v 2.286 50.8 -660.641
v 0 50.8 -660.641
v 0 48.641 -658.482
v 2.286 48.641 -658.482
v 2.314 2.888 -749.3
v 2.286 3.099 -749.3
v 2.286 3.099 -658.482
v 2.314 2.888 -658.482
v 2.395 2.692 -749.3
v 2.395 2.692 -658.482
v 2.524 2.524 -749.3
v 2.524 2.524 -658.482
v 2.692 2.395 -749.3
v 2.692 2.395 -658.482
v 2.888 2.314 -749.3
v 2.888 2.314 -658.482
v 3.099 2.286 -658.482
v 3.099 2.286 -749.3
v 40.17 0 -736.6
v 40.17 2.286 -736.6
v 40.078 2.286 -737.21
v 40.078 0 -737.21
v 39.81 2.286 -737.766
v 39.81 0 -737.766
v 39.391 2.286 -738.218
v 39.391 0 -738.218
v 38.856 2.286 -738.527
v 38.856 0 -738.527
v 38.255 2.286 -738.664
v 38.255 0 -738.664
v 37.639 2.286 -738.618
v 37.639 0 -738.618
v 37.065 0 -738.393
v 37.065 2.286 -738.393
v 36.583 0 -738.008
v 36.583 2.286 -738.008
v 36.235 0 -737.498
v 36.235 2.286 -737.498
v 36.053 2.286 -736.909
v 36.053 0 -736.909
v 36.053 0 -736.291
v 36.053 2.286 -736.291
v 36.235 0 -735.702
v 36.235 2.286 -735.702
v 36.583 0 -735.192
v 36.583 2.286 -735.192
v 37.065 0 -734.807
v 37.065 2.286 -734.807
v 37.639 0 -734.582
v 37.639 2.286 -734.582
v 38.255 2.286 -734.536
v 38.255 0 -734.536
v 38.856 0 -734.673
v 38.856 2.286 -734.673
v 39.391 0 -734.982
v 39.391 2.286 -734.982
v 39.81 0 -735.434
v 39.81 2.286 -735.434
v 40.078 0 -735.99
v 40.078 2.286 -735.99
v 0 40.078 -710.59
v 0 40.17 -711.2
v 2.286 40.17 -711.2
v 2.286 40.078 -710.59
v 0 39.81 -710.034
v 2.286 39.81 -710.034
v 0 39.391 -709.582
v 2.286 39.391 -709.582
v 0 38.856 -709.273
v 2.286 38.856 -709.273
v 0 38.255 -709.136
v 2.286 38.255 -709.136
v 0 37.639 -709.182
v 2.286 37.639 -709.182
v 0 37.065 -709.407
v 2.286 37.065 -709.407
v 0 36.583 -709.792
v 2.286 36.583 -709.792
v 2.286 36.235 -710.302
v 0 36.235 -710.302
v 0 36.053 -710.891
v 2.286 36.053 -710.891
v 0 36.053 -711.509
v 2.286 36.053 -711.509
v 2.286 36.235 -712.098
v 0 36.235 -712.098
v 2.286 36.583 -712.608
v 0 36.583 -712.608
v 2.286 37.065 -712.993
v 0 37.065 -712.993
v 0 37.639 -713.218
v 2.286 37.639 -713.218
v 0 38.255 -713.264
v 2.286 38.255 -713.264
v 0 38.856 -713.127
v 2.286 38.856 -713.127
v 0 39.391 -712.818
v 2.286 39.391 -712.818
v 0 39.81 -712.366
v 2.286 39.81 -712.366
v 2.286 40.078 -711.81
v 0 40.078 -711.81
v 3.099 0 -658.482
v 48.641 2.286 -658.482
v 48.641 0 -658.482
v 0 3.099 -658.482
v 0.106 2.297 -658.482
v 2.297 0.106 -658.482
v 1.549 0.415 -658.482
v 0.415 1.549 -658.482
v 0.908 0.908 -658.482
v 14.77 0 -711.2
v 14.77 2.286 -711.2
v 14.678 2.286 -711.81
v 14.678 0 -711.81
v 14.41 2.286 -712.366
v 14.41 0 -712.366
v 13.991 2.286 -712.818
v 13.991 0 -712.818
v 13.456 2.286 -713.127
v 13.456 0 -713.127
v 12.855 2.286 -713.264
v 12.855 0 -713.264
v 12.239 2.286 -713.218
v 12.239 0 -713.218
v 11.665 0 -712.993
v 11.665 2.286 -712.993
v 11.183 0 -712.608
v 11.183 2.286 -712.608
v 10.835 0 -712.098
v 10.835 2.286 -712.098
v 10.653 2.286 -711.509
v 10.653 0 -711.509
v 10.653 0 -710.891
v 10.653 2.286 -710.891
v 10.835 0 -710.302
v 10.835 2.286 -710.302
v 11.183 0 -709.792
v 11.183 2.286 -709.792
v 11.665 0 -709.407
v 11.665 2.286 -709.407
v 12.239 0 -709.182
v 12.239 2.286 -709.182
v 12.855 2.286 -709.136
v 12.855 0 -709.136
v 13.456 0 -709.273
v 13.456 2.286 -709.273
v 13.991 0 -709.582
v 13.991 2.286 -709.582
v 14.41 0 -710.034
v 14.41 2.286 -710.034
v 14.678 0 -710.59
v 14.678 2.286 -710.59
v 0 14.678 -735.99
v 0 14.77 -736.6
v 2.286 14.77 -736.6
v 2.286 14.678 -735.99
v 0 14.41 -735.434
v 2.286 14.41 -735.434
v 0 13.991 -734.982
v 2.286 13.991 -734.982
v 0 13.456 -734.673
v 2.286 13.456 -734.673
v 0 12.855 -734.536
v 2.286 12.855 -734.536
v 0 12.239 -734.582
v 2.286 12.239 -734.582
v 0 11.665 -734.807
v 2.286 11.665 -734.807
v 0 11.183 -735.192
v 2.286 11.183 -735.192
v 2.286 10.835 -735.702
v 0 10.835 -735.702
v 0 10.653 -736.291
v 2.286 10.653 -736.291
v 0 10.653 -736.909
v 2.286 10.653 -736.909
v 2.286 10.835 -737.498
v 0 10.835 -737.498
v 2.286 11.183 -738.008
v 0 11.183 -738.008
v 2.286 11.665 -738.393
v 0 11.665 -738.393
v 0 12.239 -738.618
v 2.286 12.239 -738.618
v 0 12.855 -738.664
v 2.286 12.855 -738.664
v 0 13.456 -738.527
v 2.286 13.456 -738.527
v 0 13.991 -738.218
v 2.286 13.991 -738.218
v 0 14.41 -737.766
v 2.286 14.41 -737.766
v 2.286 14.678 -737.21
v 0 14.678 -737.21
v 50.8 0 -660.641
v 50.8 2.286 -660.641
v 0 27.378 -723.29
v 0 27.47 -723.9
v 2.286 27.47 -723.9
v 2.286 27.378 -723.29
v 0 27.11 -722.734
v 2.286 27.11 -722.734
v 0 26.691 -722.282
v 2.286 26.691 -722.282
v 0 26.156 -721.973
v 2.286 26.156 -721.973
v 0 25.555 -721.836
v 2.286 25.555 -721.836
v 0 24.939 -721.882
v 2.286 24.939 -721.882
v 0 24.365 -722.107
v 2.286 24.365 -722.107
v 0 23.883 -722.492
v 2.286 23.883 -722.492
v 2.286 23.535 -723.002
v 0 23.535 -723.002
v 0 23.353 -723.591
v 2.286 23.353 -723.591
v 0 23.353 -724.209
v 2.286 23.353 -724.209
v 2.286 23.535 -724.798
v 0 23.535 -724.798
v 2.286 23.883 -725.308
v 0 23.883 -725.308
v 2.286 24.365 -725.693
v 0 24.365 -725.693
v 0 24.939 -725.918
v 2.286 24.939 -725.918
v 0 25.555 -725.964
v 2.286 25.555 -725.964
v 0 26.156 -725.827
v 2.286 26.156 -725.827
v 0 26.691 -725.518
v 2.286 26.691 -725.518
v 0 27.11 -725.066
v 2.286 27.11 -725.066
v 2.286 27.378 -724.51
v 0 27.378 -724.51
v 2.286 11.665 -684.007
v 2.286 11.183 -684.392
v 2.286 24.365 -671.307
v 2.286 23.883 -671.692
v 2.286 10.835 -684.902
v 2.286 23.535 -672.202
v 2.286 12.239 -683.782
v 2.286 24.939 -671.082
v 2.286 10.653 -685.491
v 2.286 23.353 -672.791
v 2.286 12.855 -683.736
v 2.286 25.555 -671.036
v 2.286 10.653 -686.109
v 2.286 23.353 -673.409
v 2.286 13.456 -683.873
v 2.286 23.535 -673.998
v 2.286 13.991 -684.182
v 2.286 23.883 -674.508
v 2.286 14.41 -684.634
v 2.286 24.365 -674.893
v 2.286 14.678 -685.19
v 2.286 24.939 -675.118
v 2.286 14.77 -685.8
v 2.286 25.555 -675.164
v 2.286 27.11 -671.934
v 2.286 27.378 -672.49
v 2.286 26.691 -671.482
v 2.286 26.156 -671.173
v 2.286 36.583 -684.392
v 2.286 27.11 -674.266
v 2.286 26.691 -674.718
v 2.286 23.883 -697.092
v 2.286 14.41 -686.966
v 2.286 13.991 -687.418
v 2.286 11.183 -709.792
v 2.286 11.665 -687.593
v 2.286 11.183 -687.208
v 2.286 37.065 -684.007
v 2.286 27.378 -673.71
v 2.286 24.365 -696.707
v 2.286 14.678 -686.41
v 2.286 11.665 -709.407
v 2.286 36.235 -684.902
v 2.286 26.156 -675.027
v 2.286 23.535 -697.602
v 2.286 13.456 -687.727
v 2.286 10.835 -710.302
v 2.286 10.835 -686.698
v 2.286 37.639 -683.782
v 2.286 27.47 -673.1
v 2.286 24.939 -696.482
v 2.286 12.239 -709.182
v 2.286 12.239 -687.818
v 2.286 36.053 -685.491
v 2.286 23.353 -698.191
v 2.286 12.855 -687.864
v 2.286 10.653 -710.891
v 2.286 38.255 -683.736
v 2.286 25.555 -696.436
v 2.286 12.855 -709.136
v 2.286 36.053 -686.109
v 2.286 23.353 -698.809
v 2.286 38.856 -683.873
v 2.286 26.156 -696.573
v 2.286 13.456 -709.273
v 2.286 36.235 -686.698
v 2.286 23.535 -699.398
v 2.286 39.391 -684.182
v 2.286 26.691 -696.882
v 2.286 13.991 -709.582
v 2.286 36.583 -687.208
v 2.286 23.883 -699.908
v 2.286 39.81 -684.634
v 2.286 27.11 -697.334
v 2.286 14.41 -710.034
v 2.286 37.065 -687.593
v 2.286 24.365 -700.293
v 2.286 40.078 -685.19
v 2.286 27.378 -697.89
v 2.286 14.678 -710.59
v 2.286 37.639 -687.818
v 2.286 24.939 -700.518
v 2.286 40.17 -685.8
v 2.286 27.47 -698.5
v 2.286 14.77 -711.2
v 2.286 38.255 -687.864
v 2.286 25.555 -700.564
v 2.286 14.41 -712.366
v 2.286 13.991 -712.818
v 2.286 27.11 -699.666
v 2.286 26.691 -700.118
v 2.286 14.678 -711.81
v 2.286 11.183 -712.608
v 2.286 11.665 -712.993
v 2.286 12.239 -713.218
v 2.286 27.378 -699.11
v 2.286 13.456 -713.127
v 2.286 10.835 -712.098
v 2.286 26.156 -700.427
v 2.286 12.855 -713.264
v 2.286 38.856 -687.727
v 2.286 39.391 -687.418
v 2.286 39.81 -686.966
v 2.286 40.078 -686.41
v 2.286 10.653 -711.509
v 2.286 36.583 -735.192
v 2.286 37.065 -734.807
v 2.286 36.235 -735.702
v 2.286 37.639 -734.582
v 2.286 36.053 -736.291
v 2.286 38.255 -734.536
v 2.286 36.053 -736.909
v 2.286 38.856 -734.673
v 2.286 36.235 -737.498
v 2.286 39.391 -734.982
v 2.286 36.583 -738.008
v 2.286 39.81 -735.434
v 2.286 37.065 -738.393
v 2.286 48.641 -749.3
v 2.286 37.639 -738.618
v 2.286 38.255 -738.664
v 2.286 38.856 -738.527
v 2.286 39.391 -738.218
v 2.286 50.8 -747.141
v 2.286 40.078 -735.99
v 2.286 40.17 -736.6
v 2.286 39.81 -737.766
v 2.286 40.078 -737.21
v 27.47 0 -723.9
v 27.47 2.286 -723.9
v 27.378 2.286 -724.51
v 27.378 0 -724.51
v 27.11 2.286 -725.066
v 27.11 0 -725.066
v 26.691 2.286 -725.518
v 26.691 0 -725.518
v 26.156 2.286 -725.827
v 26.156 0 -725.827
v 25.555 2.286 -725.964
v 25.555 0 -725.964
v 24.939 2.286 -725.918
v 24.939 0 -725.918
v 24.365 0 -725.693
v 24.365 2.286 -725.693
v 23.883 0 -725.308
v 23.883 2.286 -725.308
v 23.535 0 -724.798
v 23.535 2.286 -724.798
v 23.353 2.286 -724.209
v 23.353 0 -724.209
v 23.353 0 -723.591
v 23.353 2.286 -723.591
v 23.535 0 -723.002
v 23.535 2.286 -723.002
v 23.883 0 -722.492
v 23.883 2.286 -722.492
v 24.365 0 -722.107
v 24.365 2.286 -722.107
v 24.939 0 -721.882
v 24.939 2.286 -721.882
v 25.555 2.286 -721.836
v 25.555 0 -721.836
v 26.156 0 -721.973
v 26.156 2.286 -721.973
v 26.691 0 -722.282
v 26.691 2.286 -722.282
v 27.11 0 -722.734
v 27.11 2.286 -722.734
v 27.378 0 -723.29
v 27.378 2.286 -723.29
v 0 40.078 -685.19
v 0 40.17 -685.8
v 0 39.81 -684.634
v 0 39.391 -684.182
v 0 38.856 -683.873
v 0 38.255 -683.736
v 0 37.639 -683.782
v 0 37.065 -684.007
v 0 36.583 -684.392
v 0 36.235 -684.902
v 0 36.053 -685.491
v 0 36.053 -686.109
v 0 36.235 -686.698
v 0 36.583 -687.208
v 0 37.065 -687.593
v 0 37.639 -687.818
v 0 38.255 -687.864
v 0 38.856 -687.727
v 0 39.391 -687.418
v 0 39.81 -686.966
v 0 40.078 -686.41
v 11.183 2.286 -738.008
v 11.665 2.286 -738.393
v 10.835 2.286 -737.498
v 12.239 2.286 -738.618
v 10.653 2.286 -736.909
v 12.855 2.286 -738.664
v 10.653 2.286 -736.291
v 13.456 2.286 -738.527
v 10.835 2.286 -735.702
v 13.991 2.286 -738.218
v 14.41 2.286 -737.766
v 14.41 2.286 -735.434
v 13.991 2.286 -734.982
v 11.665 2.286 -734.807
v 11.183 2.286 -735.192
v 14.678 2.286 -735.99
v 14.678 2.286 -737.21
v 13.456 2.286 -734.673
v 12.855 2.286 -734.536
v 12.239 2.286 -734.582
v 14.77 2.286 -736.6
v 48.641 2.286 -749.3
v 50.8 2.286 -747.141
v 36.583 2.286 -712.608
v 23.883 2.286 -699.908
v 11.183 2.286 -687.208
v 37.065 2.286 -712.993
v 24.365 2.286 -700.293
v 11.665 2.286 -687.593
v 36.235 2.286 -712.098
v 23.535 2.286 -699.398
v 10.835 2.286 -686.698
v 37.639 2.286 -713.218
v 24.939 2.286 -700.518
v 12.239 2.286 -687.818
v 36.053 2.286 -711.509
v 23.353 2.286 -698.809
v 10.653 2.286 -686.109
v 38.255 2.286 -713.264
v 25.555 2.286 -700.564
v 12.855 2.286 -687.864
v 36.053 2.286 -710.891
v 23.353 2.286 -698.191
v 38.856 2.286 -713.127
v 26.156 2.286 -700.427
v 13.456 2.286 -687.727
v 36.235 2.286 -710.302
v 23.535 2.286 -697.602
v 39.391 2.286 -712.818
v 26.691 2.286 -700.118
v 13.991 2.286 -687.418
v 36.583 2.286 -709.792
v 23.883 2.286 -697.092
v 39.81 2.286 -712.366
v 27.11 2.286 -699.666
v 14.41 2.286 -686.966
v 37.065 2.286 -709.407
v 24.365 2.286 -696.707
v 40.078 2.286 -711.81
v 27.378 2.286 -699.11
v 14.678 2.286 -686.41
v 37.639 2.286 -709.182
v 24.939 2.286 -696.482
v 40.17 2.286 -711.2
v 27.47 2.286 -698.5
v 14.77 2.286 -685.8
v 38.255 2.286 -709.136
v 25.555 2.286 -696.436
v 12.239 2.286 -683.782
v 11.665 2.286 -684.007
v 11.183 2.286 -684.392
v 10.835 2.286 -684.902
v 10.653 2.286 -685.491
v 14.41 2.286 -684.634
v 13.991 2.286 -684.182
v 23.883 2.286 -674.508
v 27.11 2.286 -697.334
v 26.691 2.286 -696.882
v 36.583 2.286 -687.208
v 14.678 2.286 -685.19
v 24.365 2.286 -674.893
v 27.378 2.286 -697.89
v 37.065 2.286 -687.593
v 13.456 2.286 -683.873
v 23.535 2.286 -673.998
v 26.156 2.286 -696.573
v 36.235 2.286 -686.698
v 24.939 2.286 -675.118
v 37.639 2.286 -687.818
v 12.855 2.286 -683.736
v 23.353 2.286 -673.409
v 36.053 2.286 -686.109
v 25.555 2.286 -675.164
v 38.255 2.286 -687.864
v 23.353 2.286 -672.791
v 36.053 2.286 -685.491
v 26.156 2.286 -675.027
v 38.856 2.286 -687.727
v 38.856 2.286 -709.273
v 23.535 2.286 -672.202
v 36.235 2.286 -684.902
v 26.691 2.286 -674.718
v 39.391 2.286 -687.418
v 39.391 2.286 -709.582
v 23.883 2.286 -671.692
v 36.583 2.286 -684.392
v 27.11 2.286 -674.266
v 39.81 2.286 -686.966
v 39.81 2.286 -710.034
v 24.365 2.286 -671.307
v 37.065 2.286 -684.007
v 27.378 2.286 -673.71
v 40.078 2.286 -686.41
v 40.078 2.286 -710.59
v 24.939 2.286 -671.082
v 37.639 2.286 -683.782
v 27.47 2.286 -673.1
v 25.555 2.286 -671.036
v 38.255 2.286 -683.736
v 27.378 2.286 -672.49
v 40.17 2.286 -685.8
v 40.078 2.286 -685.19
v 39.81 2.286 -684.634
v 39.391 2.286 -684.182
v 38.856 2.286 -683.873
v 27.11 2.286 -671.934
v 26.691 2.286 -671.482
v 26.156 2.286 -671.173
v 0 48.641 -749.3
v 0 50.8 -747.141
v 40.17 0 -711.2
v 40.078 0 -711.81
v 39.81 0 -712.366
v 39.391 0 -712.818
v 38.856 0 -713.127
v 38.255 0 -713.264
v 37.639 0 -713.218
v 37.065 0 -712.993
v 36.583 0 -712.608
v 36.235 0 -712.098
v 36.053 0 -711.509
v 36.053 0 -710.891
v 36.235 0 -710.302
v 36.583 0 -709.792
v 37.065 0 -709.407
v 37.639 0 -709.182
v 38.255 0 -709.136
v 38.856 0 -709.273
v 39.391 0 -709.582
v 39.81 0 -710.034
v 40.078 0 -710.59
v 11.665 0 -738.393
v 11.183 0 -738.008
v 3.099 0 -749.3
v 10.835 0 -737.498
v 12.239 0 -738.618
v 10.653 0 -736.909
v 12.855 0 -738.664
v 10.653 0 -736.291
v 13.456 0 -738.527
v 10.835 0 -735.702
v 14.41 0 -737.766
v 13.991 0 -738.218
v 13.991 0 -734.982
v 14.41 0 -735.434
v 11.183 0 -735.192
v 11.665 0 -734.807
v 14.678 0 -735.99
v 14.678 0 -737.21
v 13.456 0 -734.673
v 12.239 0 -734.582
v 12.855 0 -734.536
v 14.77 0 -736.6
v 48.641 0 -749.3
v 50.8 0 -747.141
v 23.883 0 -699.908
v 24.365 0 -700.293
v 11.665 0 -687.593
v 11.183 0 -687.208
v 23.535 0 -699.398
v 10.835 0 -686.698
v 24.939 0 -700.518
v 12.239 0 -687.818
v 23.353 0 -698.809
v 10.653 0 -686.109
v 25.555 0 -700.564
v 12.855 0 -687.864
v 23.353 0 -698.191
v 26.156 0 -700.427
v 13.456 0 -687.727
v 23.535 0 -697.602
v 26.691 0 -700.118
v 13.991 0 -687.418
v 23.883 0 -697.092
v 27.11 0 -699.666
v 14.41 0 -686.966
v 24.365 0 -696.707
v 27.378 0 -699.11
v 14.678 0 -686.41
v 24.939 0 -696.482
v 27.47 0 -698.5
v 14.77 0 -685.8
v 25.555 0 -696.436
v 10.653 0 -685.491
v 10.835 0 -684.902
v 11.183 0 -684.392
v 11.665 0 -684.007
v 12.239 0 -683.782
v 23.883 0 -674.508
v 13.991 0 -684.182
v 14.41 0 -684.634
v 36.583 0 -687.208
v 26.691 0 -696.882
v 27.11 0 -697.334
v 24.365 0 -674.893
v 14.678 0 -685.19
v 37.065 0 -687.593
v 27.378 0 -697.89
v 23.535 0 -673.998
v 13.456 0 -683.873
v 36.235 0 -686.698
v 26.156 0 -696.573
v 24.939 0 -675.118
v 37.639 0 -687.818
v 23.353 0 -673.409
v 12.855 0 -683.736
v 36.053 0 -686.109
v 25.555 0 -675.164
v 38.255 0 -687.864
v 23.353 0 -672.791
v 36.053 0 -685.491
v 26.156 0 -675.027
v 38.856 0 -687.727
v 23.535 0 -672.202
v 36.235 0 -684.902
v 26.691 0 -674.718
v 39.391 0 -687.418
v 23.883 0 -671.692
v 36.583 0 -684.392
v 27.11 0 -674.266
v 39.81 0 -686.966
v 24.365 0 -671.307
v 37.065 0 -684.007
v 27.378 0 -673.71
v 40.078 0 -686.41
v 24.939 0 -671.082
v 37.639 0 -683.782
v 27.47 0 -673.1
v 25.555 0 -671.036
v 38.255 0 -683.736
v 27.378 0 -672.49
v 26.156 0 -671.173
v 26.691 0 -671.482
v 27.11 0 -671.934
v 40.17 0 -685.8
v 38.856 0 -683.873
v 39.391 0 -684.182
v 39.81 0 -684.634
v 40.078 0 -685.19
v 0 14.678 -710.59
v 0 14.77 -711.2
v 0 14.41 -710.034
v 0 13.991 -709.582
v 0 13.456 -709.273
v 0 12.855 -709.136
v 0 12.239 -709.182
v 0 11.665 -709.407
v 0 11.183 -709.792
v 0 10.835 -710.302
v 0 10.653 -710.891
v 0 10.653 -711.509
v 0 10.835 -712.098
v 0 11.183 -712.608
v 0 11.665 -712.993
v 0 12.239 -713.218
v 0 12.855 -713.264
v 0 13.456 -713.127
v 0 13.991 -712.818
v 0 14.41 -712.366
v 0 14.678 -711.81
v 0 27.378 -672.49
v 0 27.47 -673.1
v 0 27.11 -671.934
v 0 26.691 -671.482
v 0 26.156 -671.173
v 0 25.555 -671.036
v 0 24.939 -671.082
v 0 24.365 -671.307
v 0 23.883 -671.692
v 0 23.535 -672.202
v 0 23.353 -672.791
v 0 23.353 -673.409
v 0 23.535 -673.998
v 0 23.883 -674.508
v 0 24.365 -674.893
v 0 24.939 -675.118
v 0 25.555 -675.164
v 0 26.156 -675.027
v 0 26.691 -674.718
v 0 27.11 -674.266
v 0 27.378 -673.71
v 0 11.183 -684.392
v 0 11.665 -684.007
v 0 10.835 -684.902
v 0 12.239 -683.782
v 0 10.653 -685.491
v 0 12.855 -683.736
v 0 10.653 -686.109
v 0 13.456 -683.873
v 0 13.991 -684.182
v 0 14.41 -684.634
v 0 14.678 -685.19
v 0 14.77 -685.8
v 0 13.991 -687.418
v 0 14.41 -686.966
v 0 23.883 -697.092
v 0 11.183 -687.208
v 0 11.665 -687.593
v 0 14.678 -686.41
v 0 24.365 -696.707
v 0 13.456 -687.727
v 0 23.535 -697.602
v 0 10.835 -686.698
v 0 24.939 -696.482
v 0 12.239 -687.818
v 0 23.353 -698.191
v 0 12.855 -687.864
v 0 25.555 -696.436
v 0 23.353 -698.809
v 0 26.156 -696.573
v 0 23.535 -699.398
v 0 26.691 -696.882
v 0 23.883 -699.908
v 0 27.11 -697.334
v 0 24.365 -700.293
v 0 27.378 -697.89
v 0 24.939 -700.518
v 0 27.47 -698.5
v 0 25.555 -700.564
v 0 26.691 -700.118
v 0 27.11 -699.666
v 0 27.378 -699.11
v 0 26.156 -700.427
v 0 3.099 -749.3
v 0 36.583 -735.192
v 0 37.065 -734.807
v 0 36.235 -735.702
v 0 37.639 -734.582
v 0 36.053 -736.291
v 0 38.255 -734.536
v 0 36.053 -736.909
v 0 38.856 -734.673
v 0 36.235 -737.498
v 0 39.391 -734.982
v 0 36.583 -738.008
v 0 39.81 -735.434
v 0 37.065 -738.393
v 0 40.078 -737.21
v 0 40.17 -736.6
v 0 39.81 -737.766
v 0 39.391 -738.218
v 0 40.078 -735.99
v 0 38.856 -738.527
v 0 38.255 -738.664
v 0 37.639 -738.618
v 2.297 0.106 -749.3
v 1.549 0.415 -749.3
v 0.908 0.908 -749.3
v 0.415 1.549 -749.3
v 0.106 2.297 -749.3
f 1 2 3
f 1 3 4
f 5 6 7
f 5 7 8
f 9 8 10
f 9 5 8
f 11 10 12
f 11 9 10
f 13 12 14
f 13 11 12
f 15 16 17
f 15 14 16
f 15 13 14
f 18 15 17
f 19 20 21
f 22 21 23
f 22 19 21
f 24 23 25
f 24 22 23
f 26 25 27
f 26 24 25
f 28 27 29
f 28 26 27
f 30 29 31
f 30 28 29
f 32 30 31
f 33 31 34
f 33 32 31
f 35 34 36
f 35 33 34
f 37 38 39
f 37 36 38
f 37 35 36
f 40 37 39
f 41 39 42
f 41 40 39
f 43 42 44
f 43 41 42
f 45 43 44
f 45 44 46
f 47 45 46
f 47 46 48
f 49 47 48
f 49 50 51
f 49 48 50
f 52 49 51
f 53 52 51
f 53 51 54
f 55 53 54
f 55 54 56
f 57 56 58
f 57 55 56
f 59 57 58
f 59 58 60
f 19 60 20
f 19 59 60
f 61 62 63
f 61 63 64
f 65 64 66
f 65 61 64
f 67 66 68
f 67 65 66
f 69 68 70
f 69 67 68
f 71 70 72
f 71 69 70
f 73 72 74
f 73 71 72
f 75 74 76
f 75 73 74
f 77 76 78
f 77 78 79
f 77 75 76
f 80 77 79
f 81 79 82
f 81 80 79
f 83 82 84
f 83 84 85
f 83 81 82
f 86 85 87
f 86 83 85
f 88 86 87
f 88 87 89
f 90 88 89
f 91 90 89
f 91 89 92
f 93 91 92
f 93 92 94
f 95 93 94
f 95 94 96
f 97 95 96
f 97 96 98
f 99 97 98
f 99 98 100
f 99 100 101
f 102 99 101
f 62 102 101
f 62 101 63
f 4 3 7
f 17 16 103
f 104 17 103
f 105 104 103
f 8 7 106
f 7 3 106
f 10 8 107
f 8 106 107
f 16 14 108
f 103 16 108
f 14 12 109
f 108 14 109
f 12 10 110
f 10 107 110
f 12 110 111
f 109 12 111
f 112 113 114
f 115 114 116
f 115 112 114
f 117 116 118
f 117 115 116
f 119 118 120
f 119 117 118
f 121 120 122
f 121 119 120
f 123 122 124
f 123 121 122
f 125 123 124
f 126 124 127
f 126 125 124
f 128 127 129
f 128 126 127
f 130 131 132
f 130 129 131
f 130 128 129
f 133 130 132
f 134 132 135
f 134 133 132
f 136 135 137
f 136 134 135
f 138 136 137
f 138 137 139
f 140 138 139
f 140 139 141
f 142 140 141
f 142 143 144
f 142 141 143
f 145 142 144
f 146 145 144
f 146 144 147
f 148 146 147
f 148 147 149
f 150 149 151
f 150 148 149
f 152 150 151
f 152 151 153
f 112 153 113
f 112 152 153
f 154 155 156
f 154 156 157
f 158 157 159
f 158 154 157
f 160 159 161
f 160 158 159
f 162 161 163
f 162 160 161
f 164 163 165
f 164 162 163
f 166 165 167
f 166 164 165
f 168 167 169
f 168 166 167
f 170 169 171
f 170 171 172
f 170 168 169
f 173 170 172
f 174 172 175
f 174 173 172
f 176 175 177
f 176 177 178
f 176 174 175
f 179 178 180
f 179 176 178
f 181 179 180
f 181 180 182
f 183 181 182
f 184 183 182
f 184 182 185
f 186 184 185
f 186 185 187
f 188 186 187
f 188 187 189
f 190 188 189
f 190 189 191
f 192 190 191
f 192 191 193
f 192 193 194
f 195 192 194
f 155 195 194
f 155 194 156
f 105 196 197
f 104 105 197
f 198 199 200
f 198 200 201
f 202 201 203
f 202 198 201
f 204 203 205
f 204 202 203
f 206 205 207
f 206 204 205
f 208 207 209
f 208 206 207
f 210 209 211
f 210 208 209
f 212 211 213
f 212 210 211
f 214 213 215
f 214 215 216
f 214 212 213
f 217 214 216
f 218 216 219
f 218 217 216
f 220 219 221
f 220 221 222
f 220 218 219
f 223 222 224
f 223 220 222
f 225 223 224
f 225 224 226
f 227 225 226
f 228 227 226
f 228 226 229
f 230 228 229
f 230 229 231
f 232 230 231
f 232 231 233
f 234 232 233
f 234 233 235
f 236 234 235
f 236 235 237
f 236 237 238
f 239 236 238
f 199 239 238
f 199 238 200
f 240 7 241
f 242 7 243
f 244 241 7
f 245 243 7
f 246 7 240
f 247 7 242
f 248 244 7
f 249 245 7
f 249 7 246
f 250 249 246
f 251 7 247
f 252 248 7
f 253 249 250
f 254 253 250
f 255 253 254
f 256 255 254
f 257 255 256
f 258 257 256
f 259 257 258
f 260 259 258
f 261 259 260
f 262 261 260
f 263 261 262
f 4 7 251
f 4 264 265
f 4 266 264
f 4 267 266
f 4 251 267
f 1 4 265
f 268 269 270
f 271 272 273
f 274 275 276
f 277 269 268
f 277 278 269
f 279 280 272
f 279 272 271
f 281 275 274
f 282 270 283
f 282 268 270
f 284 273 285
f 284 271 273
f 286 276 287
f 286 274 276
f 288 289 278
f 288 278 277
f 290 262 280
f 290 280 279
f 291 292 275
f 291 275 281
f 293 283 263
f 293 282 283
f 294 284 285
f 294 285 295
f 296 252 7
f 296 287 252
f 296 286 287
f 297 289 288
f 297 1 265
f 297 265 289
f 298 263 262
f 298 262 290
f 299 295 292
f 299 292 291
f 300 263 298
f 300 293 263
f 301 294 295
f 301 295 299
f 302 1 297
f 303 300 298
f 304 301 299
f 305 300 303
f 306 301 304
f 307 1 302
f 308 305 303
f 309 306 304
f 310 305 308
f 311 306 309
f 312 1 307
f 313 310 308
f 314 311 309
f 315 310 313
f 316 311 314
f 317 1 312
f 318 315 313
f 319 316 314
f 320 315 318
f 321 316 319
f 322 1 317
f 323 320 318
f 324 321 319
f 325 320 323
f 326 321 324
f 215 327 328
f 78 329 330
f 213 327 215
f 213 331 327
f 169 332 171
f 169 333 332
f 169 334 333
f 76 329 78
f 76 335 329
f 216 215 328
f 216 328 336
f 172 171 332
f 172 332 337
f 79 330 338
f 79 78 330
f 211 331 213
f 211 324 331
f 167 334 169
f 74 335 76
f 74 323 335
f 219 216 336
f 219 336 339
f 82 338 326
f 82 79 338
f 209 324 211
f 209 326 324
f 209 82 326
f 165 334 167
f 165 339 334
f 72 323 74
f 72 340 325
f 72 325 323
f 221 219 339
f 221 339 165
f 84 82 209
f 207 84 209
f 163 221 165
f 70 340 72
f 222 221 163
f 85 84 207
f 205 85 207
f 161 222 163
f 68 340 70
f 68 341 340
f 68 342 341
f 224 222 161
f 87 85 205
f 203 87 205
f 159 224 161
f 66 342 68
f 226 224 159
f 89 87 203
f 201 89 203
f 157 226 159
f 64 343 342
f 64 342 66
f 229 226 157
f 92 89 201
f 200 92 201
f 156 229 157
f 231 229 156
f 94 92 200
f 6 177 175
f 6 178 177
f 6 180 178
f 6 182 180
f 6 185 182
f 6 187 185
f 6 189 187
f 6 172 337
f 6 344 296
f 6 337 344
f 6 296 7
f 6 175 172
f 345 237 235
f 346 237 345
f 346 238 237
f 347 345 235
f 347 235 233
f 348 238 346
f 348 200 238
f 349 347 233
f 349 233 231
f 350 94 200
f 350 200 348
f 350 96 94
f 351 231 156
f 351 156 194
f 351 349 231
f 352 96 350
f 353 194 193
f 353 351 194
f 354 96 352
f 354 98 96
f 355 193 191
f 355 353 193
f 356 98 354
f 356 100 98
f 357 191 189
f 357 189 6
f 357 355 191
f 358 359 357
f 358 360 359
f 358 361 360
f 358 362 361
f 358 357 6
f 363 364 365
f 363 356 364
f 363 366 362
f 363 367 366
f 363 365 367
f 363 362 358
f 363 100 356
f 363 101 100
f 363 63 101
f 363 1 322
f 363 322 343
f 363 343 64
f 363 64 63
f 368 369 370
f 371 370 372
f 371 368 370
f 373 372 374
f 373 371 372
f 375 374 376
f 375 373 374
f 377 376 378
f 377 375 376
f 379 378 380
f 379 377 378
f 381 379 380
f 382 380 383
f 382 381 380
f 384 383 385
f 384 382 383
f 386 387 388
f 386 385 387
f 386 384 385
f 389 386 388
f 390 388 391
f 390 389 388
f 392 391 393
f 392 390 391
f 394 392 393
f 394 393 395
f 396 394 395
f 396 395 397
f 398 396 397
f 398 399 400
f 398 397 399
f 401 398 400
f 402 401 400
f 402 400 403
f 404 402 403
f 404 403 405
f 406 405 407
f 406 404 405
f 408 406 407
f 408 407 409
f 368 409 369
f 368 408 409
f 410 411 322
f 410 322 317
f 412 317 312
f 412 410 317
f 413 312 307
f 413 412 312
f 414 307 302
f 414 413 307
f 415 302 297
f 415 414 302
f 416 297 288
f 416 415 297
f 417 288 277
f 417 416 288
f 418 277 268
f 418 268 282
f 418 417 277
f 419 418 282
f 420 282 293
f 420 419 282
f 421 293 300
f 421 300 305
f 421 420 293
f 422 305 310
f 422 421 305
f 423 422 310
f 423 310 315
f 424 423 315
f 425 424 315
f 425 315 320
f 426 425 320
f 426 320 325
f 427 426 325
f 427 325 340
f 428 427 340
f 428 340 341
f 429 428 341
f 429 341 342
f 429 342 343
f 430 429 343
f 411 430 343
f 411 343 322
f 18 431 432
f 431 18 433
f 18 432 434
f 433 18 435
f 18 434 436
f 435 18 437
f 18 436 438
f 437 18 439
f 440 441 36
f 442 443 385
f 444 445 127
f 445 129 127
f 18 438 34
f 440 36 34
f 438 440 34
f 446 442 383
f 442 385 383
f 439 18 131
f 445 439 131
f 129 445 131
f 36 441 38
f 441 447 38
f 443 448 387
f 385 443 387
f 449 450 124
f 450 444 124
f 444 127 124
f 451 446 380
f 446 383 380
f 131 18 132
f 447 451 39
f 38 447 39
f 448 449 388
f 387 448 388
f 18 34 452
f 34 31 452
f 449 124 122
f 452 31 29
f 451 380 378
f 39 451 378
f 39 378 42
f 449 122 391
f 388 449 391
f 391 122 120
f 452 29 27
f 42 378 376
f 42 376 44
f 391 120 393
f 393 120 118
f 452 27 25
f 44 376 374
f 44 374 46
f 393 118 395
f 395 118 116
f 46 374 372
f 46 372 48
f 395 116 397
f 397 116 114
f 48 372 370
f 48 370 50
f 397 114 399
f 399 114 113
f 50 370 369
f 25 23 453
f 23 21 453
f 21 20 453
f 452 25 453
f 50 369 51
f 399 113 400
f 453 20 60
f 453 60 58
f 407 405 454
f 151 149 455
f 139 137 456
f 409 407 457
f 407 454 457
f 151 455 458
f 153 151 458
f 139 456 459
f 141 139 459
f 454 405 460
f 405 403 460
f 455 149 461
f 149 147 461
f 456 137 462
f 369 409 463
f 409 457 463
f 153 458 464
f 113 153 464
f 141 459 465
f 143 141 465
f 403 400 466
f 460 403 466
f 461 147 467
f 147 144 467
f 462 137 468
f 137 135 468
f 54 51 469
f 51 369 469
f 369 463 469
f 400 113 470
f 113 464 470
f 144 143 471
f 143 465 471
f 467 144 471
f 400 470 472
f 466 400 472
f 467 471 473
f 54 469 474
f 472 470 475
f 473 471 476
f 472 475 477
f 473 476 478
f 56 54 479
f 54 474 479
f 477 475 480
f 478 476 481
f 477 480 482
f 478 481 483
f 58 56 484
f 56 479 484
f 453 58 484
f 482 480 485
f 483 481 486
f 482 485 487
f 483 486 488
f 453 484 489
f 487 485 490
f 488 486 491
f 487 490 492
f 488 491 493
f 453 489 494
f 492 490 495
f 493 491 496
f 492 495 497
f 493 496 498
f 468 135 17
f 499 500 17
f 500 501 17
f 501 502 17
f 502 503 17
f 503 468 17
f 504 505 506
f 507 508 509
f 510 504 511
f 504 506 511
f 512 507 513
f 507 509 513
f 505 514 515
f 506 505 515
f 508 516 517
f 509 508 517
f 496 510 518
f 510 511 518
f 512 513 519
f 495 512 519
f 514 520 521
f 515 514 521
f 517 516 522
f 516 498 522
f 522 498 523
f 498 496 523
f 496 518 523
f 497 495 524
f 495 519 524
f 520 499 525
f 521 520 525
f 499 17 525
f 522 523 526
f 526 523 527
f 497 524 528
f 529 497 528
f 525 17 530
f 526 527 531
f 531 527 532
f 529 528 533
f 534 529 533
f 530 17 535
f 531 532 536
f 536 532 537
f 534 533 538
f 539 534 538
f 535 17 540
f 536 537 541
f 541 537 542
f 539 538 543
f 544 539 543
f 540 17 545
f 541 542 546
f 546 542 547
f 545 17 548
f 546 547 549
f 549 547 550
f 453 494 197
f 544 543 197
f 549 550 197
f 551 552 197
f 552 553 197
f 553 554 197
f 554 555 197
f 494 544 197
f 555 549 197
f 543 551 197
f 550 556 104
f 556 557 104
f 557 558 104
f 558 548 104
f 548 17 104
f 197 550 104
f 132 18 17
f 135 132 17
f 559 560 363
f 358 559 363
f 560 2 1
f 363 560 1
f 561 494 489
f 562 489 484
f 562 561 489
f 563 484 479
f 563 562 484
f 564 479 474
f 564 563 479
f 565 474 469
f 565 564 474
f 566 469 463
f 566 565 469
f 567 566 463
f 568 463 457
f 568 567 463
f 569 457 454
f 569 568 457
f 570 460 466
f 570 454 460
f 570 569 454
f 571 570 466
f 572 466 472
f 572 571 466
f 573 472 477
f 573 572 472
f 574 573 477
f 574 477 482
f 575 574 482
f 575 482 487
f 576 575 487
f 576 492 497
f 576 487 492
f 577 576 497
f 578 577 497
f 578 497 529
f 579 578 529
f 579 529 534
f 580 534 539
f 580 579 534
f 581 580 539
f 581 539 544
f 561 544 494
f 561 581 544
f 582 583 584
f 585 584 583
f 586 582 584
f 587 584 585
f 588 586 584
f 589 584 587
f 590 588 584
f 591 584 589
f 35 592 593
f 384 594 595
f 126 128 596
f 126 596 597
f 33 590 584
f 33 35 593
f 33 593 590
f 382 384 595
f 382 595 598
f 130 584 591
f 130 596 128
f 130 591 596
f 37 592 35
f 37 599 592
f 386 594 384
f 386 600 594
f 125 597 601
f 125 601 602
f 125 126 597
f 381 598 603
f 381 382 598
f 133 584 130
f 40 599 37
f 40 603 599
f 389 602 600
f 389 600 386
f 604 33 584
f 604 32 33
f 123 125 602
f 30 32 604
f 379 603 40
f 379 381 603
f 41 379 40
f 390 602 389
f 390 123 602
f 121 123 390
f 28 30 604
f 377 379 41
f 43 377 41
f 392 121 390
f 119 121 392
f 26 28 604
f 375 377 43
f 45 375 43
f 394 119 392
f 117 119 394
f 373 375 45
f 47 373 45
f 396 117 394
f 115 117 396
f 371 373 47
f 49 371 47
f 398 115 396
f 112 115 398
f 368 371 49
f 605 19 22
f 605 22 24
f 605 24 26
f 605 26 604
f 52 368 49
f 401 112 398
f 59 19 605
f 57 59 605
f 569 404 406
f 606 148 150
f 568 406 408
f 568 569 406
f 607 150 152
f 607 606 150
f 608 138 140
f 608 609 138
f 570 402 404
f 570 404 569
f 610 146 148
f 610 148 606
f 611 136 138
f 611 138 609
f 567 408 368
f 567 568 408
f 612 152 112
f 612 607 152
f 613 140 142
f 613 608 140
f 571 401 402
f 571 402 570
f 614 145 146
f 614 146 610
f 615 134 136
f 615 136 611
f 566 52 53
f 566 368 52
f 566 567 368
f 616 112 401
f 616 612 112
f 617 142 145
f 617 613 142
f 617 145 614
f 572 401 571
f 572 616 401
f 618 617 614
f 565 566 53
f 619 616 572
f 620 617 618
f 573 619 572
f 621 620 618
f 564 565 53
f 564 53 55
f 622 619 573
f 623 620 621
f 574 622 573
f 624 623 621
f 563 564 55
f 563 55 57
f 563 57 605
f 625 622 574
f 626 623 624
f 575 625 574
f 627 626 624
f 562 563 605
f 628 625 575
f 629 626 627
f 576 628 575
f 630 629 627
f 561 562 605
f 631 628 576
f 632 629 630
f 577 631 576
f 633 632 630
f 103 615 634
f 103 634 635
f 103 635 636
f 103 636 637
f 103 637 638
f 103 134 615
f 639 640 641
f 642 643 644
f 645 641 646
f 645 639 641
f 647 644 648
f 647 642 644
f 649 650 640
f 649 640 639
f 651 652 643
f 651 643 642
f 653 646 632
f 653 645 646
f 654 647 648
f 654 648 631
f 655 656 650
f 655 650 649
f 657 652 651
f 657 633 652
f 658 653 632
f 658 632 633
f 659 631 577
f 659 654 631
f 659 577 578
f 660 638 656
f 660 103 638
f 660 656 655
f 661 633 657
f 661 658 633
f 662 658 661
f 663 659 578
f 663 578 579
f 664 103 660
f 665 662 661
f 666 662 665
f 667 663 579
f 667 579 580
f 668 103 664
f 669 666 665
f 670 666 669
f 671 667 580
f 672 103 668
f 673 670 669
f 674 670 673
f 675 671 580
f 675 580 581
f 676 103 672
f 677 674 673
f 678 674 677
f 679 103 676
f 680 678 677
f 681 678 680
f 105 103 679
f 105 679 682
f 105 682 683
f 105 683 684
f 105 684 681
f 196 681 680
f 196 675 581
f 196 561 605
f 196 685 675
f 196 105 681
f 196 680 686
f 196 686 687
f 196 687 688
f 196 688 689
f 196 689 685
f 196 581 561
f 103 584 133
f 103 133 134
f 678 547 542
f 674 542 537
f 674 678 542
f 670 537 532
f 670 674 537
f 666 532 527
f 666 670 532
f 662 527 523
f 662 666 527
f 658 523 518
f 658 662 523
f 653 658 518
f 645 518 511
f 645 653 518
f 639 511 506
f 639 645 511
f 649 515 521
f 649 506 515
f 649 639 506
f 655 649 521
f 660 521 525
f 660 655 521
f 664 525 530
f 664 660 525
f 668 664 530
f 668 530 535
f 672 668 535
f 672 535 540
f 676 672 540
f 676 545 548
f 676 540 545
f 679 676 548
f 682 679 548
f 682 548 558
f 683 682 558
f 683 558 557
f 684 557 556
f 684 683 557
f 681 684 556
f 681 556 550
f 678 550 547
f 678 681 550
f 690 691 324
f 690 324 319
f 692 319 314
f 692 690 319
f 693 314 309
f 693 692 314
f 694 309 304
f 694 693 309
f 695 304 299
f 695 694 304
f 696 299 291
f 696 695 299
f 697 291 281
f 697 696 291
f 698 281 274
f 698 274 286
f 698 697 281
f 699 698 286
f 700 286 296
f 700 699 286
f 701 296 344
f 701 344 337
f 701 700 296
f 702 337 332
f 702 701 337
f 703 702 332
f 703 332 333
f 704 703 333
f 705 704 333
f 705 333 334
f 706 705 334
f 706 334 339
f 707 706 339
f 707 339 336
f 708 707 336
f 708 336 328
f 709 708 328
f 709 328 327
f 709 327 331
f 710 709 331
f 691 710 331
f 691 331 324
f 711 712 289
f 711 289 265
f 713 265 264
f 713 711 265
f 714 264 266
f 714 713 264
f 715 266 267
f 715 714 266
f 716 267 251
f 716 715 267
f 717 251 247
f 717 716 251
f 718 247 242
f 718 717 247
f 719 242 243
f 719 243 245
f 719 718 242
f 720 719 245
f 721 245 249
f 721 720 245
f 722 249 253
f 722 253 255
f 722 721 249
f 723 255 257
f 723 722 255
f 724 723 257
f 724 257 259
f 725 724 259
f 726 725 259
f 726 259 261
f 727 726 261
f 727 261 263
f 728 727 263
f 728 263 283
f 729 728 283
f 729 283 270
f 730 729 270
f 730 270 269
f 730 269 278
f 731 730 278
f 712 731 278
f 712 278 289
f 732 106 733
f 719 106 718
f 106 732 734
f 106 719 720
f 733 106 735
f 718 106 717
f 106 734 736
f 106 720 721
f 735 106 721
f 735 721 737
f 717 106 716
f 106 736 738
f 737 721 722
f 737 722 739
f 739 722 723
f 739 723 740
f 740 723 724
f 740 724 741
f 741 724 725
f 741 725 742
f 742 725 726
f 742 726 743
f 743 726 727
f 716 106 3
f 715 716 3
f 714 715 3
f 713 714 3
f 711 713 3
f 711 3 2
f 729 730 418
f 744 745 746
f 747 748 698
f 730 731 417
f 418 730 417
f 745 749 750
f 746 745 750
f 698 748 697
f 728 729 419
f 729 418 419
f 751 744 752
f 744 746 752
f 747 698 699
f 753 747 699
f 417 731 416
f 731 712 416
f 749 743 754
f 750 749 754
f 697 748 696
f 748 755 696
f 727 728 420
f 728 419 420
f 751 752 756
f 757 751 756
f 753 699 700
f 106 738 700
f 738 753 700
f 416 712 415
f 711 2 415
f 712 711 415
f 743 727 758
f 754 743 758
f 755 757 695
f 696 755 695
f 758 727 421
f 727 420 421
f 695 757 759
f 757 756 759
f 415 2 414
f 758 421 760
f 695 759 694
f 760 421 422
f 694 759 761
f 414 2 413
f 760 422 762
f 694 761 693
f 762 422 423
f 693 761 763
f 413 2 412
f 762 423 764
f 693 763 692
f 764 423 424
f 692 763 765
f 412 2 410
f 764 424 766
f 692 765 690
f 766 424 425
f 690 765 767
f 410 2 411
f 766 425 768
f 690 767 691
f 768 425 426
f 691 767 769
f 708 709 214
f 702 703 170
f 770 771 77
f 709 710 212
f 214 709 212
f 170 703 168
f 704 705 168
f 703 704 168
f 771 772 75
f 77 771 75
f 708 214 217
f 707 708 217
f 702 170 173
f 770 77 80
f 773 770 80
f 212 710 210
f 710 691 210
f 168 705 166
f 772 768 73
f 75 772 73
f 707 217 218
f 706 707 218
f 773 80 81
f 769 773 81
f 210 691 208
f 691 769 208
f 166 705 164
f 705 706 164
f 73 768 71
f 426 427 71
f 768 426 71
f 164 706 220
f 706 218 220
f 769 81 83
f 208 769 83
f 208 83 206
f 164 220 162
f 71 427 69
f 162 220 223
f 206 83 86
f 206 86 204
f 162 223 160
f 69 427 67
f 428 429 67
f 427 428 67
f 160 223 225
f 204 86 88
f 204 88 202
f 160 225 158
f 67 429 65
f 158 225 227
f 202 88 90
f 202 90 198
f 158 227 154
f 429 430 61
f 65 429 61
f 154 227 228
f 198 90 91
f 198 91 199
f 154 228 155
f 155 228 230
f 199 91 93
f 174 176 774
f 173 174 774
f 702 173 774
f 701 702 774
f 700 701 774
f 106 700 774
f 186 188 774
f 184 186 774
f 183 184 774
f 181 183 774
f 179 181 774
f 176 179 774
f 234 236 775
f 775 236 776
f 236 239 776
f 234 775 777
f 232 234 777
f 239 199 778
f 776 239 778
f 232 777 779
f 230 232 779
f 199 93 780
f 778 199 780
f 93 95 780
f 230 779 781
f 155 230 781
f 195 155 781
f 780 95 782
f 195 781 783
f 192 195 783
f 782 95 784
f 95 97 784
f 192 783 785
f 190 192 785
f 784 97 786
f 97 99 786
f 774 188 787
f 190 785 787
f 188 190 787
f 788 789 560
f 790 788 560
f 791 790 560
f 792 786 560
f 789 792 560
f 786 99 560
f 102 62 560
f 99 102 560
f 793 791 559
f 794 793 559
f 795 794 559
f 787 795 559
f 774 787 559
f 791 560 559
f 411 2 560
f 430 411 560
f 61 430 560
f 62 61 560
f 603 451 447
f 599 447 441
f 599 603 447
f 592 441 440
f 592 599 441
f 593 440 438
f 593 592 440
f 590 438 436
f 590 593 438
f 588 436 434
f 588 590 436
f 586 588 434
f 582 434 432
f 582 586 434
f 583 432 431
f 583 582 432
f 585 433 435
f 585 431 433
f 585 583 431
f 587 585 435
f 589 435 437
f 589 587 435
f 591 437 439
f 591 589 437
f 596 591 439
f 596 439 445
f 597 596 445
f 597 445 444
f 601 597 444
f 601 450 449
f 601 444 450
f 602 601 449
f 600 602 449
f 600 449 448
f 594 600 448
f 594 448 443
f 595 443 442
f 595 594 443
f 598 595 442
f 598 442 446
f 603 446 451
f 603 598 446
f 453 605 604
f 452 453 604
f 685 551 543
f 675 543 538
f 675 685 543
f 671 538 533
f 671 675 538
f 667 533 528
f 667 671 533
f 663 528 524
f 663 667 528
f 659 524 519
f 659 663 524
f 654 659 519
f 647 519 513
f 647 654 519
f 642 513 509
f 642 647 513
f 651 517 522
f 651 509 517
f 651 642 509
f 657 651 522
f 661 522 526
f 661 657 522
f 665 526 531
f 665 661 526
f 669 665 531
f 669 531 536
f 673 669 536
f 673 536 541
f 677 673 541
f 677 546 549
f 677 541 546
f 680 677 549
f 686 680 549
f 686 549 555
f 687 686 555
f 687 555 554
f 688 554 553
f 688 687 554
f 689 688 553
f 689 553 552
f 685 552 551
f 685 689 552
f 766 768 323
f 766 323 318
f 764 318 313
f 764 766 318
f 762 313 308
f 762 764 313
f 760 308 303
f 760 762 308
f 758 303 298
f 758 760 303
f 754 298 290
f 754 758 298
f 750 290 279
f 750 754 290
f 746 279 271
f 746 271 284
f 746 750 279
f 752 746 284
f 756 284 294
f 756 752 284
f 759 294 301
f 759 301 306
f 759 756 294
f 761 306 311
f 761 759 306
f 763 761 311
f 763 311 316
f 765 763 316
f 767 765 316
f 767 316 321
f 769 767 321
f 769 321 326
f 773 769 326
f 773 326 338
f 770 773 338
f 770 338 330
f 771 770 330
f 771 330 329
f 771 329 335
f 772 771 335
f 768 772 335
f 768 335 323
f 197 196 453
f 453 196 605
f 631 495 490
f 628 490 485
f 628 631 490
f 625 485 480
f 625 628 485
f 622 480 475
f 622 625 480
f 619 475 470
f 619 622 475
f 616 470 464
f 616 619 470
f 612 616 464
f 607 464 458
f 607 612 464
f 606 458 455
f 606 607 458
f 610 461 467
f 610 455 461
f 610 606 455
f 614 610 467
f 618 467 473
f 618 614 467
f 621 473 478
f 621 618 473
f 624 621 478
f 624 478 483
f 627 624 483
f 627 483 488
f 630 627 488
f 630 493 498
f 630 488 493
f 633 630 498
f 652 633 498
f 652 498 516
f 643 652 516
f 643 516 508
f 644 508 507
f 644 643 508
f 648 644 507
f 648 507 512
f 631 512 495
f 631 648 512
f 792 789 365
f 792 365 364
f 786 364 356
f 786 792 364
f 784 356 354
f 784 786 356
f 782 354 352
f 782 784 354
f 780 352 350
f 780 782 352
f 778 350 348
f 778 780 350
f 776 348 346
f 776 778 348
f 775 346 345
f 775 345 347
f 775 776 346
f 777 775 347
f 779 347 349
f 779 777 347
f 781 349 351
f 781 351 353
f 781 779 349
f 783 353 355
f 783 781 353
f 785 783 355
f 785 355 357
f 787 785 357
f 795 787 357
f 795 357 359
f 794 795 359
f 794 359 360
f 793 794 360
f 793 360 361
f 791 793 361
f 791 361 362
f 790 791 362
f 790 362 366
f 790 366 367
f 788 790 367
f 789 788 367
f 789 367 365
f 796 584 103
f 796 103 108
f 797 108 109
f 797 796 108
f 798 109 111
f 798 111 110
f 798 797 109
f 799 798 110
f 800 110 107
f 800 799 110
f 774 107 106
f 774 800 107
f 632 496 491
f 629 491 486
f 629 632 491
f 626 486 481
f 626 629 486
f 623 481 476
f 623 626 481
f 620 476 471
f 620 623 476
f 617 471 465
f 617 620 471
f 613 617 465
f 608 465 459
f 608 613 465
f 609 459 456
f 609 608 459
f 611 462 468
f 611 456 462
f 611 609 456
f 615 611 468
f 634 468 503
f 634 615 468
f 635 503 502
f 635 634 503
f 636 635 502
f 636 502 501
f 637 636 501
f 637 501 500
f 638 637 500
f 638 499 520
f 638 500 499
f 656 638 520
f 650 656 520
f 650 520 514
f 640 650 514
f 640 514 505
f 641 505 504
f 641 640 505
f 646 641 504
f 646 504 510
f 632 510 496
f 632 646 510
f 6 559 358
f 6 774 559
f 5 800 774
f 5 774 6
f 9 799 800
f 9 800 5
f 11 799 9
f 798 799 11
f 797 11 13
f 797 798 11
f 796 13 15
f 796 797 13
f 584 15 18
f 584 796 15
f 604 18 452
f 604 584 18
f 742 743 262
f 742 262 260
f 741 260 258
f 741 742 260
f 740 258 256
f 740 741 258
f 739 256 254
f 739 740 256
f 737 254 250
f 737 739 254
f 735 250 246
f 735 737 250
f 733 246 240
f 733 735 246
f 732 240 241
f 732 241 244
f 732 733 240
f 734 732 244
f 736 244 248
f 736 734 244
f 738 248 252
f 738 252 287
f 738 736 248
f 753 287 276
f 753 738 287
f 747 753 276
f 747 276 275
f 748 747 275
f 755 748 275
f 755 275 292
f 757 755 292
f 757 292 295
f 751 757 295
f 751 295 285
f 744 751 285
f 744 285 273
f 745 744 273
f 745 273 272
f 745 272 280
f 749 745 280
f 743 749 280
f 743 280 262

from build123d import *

# Parameters (mm, degrees)
CUT_EXTRUDE1_START       = 14.7701
CUT_EXTRUDE1_OUTLINE_W   = 2.286
CUT_EXTRUDE1_OUTLINE_H   = 127
CUT_EXTRUDE1_DEPTH       = 8.5598
CUT_EXTRUDE1_START_2     = 27.4701
CUT_EXTRUDE1_2_OUTLINE_W = 2.286
CUT_EXTRUDE1_2_OUTLINE_H = 127
CUT_EXTRUDE1_2_DEPTH     = 8.5598
CUT_EXTRUDE1_START_3     = 40.1701
CUT_EXTRUDE1_3_OUTLINE_W = 2.286
CUT_EXTRUDE1_3_OUTLINE_H = 127
CUT_EXTRUDE1_3_DEPTH     = 8.4709
CUT_EXTRUDE1_START_4     = 2.286
CUT_EXTRUDE1_4_OUTLINE_W = 2.286
CUT_EXTRUDE1_4_OUTLINE_H = 127
CUT_EXTRUDE1_4_DEPTH     = 8.3439
CUT_EXTRUDE1_5_OUTLINE_R = 2.0701
CUT_EXTRUDE1_5_DEPTH     = 3.0988
CUT_EXTRUDE1_START_5     = 10.6299
CUT_EXTRUDE1_6_OUTLINE_W = 2.286
CUT_EXTRUDE1_6_OUTLINE_H = 127
CUT_EXTRUDE1_6_DEPTH     = 40.1701
CUT_EXTRUDE1_START_6     = -1
CUT_EXTRUDE1_7_OUTLINE_R = 2.0701
CUT_EXTRUDE1_7_DEPTH     = 3.286
CUT_EXTRUDE1_START_7     = -749.3
CUT_EXTRUDE1_8_DEPTH     = 127
CUT_EXTRUDE1_START_8     = 564.229492087
CUT_EXTRUDE1_9_OUTLINE_W = 3.286
CUT_EXTRUDE1_9_OUTLINE_H = 75
CUT_EXTRUDE1_9_DEPTH     = 2.770507913
CHAMFER1_SIZE            = 2.159
BOSS_EXTRUDE1_START      = -2.286
BOSS_EXTRUDE1_DEPTH      = 2.286
BOSS_EXTRUDE2_START      = -2.286
BOSS_EXTRUDE2_DEPTH      = 2.286
SKETCH4_W                = 50.8
SKETCH4_H                = 50.8
CUT_EXTRUDE2_DEPTH       = 36.181674144
BOSS_EXTRUDE3_DEPTH      = 2.286
BOSS_EXTRUDE4_START      = -2.286
BOSS_EXTRUDE4_DEPTH      = 2.286
CHAMFER2_SIZE            = 2.159


with BuildPart() as part:
    # Cut-Extrude1: read off the stored shape, not the designer's step
    # Cut-Extrude1 outline → Cut-Extrude1 (new body)
    with BuildSketch(Plane(origin=(0, 0, 0), x_dir=(1, 0, 0), z_dir=(0, 1, 0)).offset(CUT_EXTRUDE1_START)):
        with Locations((1.143, 685.8)):
            Rectangle(CUT_EXTRUDE1_OUTLINE_W, CUT_EXTRUDE1_OUTLINE_H)
    extrude(amount=CUT_EXTRUDE1_DEPTH)



with BuildPart() as body_2:
    # Cut-Extrude1 2 outline → Cut-Extrude1 2 (new body)
    with BuildSketch(Plane(origin=(0, 0, 0), x_dir=(1, 0, 0), z_dir=(0, 1, 0)).offset(CUT_EXTRUDE1_START_2)):
        with Locations((1.143, 685.8)):
            Rectangle(CUT_EXTRUDE1_2_OUTLINE_W, CUT_EXTRUDE1_2_OUTLINE_H)
    extrude(amount=CUT_EXTRUDE1_2_DEPTH)


with BuildPart() as body_3:
    # Cut-Extrude1 3 outline → Cut-Extrude1 3 (new body)
    with BuildSketch(Plane(origin=(0, 0, 0), x_dir=(1, 0, 0), z_dir=(0, 1, 0)).offset(CUT_EXTRUDE1_START_3)):
        with Locations((1.143, 685.8)):
            Rectangle(CUT_EXTRUDE1_3_OUTLINE_W, CUT_EXTRUDE1_3_OUTLINE_H)
    extrude(amount=CUT_EXTRUDE1_3_DEPTH)


with BuildPart() as body_4:
    # Cut-Extrude1 4 outline → Cut-Extrude1 4 (new body)
    with BuildSketch(Plane(origin=(0, 0, 0), x_dir=(1, 0, 0), z_dir=(0, 1, 0)).offset(CUT_EXTRUDE1_START_4)):
        with Locations((1.143, 685.8)):
            Rectangle(CUT_EXTRUDE1_4_OUTLINE_W, CUT_EXTRUDE1_4_OUTLINE_H)
    extrude(amount=CUT_EXTRUDE1_4_DEPTH)

    # Cut-Extrude1 5 outline → Cut-Extrude1 5 (add)
    with BuildSketch(Plane(origin=(0, 0, 0), x_dir=(1, 0, 0), z_dir=(0, 1, 0))):
        with BuildLine():
            ThreePointArc((23.3299, 622.3), (23.936218252, 623.763781748), (25.4, 624.3701))
            ThreePointArc((25.4, 624.3701), (26.863781748, 623.763781748), (27.4701, 622.3))
            Line((27.4701, 622.3), (50.8, 622.3))
            Line((50.8, 622.3), (50.8, 747.141))
            Line((50.8, 747.141), (48.641, 749.3))
            Line((48.641, 749.3), (0, 749.3))
            Line((0, 749.3), (0, 622.3))
            Line((0, 622.3), (23.3299, 622.3))
        make_face()
        with Locations((12.7, 635)):
            Circle(CUT_EXTRUDE1_5_OUTLINE_R, mode=Mode.SUBTRACT)
        with Locations((25.4, 647.7)):
            Circle(CUT_EXTRUDE1_5_OUTLINE_R, mode=Mode.SUBTRACT)
        with Locations((12.7, 660.4)):
            Circle(CUT_EXTRUDE1_5_OUTLINE_R, mode=Mode.SUBTRACT)
        with Locations((25.4, 673.1)):
            Circle(CUT_EXTRUDE1_5_OUTLINE_R, mode=Mode.SUBTRACT)
        with Locations((38.1, 635)):
            Circle(CUT_EXTRUDE1_5_OUTLINE_R, mode=Mode.SUBTRACT)
        with Locations((38.1, 660.4)):
            Circle(CUT_EXTRUDE1_5_OUTLINE_R, mode=Mode.SUBTRACT)
        with Locations((12.7, 685.8)):
            Circle(CUT_EXTRUDE1_5_OUTLINE_R, mode=Mode.SUBTRACT)
        with Locations((12.7, 711.2)):
            Circle(CUT_EXTRUDE1_5_OUTLINE_R, mode=Mode.SUBTRACT)
        with Locations((25.4, 698.5)):
            Circle(CUT_EXTRUDE1_5_OUTLINE_R, mode=Mode.SUBTRACT)
        with Locations((12.7, 736.6)):
            Circle(CUT_EXTRUDE1_5_OUTLINE_R, mode=Mode.SUBTRACT)
        with Locations((25.4, 723.9)):
            Circle(CUT_EXTRUDE1_5_OUTLINE_R, mode=Mode.SUBTRACT)
        with Locations((38.1, 685.8)):
            Circle(CUT_EXTRUDE1_5_OUTLINE_R, mode=Mode.SUBTRACT)
        with Locations((38.1, 711.2)):
            Circle(CUT_EXTRUDE1_5_OUTLINE_R, mode=Mode.SUBTRACT)
        with Locations((38.1, 736.6)):
            Circle(CUT_EXTRUDE1_5_OUTLINE_R, mode=Mode.SUBTRACT)
    extrude(amount=CUT_EXTRUDE1_5_DEPTH)


with BuildPart() as part_1:
    add(part.part)

    add(body_2.part)  # Cut-Extrude1 6 merges body 2

    add(body_3.part)  # Cut-Extrude1 6 merges body 3

    add(body_4.part)  # Cut-Extrude1 6 merges body 4
    # Cut-Extrude1 6 outline → Cut-Extrude1 6 (add)
    with BuildSketch(Plane(origin=(0, 0, 0), x_dir=(1, 0, 0), z_dir=(0, 1, 0)).offset(CUT_EXTRUDE1_START_5)):
        with Locations((1.143, 685.8)):
            Rectangle(CUT_EXTRUDE1_6_OUTLINE_W, CUT_EXTRUDE1_6_OUTLINE_H)
    extrude(amount=CUT_EXTRUDE1_6_DEPTH)

    # Cut-Extrude1 7 outline → Cut-Extrude1 7 (cut)
    with BuildSketch(Plane.YZ.offset(CUT_EXTRUDE1_START_6)):
        with BuildLine():
            ThreePointArc((23.3299, -622.3), (23.936218252, -623.763781748), (25.4, -624.3701))
            ThreePointArc((25.4, -624.3701), (26.863781748, -623.763781748), (27.4701, -622.3))
            Line((27.4701, -622.3), (23.3299, -622.3))
        make_face()
        with Locations((25.4, -723.9)):
            Circle(CUT_EXTRUDE1_7_OUTLINE_R)
        with Locations((25.4, -698.5)):
            Circle(CUT_EXTRUDE1_7_OUTLINE_R)
        with Locations((25.4, -673.1)):
            Circle(CUT_EXTRUDE1_7_OUTLINE_R)
        with Locations((25.4, -647.7)):
            Circle(CUT_EXTRUDE1_7_OUTLINE_R)
        with Locations((12.7, -736.6)):
            Circle(CUT_EXTRUDE1_7_OUTLINE_R)
        with Locations((12.7, -711.2)):
            Circle(CUT_EXTRUDE1_7_OUTLINE_R)
        with Locations((12.7, -685.8)):
            Circle(CUT_EXTRUDE1_7_OUTLINE_R)
        with Locations((12.7, -660.4)):
            Circle(CUT_EXTRUDE1_7_OUTLINE_R)
        with Locations((12.7, -635)):
            Circle(CUT_EXTRUDE1_7_OUTLINE_R)
        with Locations((38.1, -736.6)):
            Circle(CUT_EXTRUDE1_7_OUTLINE_R)
        with Locations((38.1, -711.2)):
            Circle(CUT_EXTRUDE1_7_OUTLINE_R)
        with Locations((38.1, -685.8)):
            Circle(CUT_EXTRUDE1_7_OUTLINE_R)
        with Locations((38.1, -660.4)):
            Circle(CUT_EXTRUDE1_7_OUTLINE_R)
        with Locations((38.1, -635)):
            Circle(CUT_EXTRUDE1_7_OUTLINE_R)
    extrude(amount=CUT_EXTRUDE1_7_DEPTH, mode=Mode.SUBTRACT)

    # Cut-Extrude1 8 outline → Cut-Extrude1 8 (cut)
    with BuildSketch(Plane.XY.offset(CUT_EXTRUDE1_START_7)):
        with BuildLine():
            ThreePointArc((3.0988, 0), (0.907617506, 0.907617506), (0, 3.0988))
            Line((0, 3.0988), (2.4e-08, 50))
            Line((2.4e-08, 50), (-1, 50))
            Line((-1, 50), (-1, -1))
            Line((-1, -1), (50.8, -1))
            Line((50.8, -1), (50.8, 0))
            Line((50.8, 0), (3.0988, 0))
        make_face()
        with BuildLine():
            Line((3.0988, 2.286), (50.8, 2.286))
            Line((50.8, 2.286), (50.8, 3.0988))
            Line((50.8, 3.0988), (2.286, 3.0988))
            ThreePointArc((2.286, 3.0988), (2.524063608, 2.524063608), (3.0988, 2.286))
        make_face()
    extrude(amount=CUT_EXTRUDE1_8_DEPTH, mode=Mode.SUBTRACT)

    # Cut-Extrude1 9 outline → Cut-Extrude1 9 (cut)
    with BuildSketch(Plane(origin=(0, 0, 0), x_dir=(1, 0, 0), z_dir=(0, 0.7071067811865511, -0.7071067811865441)).offset(CUT_EXTRUDE1_START_8)):
        with Locations((0.643, 459.5)):
            Rectangle(CUT_EXTRUDE1_9_OUTLINE_W, CUT_EXTRUDE1_9_OUTLINE_H)
    extrude(amount=CUT_EXTRUDE1_9_DEPTH, mode=Mode.SUBTRACT)

    # Chamfer1
    chamfer1_edges = [part_1.edges().sort_by_distance(p)[0] for p in [
        (1.143, 50.8, -622.3),
        (50.8, 1.143, -622.3),
    ]]
    chamfer(chamfer1_edges, length=CHAMFER1_SIZE)

    # Sketch2 → Boss-Extrude1 (add)
    with BuildSketch(Plane(origin=(2.286, 0, 0), x_dir=(0, 0, -1), z_dir=(1, 0, 0)).offset(BOSS_EXTRUDE1_START)):
        with BuildLine():
            Line((622.3, 27.4701), (622.3, 23.3299))
            ThreePointArc((622.3, 23.3299), (624.3701, 25.4), (622.3, 27.4701))
        make_face()
    extrude(amount=BOSS_EXTRUDE1_DEPTH)

    # Sketch3 → Boss-Extrude2 (add)
    with BuildSketch(Plane(origin=(0, 2.286, 0), x_dir=(1, 0, 0), z_dir=(0, 1, 0)).offset(BOSS_EXTRUDE2_START)):
        with BuildLine():
            Line((23.3299, 622.3), (27.4701, 622.3))
            ThreePointArc((27.4701, 622.3), (25.4, 624.3701), (23.3299, 622.3))
        make_face()
    extrude(amount=BOSS_EXTRUDE2_DEPTH)

    # Sketch4 → Cut-Extrude2 (cut)
    with BuildSketch(Plane.XY.offset(-622.3)):
        with Locations((25.4, 25.4)):
            Rectangle(SKETCH4_W, SKETCH4_H)
    extrude(amount=-CUT_EXTRUDE2_DEPTH, mode=Mode.SUBTRACT)

    # Sketch5 → Boss-Extrude3 (add)
    with BuildSketch(Plane.XZ):
        with BuildLine():
            Line((38.878035938, -658.481674144), (37.321964062, -658.481674144))
            ThreePointArc((37.321964062, -658.481674144), (38.1, -662.4701), (38.878035938, -658.481674144))
        make_face()
        with BuildLine():
            Line((13.478035938, -658.481674144), (11.921964062, -658.481674144))
            ThreePointArc((11.921964062, -658.481674144), (12.7, -662.4701), (13.478035938, -658.481674144))
        make_face()
    extrude(amount=-BOSS_EXTRUDE3_DEPTH)

    # Sketch6 → Boss-Extrude4 (add)
    with BuildSketch(Plane(origin=(2.286, 0, 0), x_dir=(0, 0, -1), z_dir=(1, 0, 0)).offset(BOSS_EXTRUDE4_START)):
        with BuildLine():
            Line((658.481674144, 38.878035938), (658.481674144, 37.321964062))
            ThreePointArc((658.481674144, 37.321964062), (662.4701, 38.1), (658.481674144, 38.878035938))
        make_face()
        with BuildLine():
            Line((658.481674144, 11.921964062), (658.481674144, 13.478035938))
            ThreePointArc((658.481674144, 13.478035938), (662.4701, 12.7), (658.481674144, 11.921964062))
        make_face()
    extrude(amount=BOSS_EXTRUDE4_DEPTH)

    # Chamfer2
    chamfer2_edges = [part_1.edges().sort_by_distance(p)[0] for p in [
        (50.8, 1.143, -658.481674144),
        (1.143, 50.8, -658.481674144),
    ]]
    chamfer(chamfer2_edges, length=CHAMFER2_SIZE)


solid = part_1.part
